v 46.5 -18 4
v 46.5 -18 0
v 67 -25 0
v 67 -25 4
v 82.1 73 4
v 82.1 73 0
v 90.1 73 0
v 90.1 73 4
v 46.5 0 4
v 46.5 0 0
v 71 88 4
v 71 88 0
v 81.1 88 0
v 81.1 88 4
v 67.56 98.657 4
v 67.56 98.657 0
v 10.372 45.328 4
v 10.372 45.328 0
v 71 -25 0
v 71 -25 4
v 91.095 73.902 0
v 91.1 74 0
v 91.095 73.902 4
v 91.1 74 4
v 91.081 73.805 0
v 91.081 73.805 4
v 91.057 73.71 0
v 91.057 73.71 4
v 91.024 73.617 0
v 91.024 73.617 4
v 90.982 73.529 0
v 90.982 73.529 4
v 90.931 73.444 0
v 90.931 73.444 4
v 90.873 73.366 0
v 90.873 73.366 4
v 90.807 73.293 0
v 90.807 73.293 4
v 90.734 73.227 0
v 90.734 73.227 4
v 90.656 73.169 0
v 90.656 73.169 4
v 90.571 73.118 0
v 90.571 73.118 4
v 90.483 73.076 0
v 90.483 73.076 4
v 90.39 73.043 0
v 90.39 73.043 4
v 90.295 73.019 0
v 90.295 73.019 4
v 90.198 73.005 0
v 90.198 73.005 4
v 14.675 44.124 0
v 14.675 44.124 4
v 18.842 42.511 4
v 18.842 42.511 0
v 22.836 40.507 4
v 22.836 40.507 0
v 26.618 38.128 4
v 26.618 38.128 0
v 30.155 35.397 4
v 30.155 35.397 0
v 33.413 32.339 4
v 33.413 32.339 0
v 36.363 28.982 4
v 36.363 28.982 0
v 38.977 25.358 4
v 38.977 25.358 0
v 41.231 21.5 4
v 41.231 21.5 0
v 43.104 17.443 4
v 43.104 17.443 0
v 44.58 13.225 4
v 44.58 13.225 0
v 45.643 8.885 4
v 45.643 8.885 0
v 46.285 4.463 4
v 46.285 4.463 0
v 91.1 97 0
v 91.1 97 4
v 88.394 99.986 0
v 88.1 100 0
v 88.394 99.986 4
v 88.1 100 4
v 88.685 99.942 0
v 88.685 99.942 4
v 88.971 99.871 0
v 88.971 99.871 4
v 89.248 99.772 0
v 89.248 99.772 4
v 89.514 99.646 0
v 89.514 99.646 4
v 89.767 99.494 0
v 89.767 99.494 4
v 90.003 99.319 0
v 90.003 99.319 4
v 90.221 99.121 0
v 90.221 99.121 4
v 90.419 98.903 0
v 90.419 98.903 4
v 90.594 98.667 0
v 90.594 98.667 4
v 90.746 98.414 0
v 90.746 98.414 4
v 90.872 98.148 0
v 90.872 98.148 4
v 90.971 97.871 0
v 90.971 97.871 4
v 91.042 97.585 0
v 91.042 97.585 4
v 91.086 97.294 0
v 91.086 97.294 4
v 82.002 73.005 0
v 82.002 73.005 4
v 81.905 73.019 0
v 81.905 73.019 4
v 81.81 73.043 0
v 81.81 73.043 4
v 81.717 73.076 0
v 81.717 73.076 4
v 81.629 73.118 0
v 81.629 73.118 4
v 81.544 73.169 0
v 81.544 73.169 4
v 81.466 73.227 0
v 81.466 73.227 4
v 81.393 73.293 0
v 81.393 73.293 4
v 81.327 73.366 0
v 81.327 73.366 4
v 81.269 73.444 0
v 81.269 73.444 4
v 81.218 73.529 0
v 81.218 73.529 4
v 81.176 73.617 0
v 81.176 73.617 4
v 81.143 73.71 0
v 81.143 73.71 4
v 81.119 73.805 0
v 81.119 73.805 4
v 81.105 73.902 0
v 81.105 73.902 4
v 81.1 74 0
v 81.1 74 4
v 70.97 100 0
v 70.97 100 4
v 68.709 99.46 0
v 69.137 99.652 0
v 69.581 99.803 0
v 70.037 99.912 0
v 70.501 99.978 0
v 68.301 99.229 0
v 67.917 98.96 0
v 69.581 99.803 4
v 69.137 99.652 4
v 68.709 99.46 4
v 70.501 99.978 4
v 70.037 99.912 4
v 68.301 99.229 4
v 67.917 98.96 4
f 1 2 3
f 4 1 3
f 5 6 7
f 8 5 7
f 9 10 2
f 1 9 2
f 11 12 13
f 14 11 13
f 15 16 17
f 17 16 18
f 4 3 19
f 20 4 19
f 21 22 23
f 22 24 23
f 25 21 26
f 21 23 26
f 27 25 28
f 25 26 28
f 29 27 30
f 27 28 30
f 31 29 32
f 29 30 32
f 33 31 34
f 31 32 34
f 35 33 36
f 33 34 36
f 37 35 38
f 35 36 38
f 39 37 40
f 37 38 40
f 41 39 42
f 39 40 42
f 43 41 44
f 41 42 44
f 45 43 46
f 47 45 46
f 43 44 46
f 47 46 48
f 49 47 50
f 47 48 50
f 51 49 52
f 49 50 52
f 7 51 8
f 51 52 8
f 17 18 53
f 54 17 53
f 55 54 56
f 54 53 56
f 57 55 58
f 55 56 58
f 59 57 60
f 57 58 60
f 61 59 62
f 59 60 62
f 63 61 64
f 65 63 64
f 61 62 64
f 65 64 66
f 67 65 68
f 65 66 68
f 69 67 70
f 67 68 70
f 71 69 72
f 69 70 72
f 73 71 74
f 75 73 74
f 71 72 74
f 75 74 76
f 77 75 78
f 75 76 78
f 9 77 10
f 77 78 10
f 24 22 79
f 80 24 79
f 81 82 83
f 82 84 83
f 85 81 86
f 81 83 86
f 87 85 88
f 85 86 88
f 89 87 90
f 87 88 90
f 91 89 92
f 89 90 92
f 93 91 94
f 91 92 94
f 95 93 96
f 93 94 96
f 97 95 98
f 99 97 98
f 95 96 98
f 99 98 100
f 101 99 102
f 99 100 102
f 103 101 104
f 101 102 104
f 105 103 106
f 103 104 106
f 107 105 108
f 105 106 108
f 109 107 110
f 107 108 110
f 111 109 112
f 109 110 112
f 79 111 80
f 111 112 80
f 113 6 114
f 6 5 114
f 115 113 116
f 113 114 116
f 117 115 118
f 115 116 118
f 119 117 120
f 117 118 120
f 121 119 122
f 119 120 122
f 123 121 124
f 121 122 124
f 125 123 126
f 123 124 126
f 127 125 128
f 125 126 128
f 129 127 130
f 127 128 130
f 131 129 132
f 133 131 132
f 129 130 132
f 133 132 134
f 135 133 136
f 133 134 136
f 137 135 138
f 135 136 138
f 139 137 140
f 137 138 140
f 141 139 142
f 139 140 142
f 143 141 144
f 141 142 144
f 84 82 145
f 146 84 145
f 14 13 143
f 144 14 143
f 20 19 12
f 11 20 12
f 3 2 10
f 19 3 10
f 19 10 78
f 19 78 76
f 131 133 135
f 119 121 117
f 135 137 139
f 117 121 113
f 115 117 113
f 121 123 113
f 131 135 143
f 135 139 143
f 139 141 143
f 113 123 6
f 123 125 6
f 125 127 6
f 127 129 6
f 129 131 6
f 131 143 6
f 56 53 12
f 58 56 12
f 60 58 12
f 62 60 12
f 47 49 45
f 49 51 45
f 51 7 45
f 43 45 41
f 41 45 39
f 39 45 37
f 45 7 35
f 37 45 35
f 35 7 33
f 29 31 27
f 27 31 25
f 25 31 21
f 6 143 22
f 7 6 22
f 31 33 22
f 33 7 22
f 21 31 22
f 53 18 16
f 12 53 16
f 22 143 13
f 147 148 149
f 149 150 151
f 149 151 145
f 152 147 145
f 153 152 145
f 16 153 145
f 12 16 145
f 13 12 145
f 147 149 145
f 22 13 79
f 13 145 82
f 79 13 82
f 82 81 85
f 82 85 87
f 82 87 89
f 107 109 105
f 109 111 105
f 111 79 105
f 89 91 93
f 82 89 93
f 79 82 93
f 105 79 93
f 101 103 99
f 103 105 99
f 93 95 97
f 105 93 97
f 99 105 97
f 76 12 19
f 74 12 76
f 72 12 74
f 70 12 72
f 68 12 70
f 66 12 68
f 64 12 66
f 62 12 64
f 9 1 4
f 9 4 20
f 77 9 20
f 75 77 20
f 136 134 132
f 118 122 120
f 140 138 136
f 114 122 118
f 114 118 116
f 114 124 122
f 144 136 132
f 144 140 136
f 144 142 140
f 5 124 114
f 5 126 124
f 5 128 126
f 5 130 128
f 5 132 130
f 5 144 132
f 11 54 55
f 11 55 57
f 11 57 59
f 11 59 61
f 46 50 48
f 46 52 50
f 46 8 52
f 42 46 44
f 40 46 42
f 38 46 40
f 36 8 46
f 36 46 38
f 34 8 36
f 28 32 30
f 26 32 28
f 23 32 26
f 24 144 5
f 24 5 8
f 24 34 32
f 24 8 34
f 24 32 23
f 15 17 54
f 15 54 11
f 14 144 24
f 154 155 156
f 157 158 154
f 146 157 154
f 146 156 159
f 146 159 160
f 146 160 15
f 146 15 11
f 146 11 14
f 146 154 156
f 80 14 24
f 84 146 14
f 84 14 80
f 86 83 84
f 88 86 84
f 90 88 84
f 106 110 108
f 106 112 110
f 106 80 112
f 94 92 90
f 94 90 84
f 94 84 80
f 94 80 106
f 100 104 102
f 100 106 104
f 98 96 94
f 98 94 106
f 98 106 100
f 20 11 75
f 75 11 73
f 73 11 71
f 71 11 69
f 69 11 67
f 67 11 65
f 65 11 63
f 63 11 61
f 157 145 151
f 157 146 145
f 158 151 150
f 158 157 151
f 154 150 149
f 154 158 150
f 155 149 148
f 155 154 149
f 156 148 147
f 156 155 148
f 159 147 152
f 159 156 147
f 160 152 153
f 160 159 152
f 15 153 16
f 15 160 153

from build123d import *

# Parameters (mm, degrees)
BOSS_EXTRU_1_DEPTH = 4
FILLET1_R          = 5
FILLET1_2_R        = 3
FILLET1_3_R        = 1


with BuildPart() as part:
    # Esquisse1 → Boss.-Extru.1 (new body)
    with BuildSketch(Plane.XY):
        with BuildLine():
            Line((46.5, 0), (46.5, -18))
            Line((46.5, -18), (67, -25))
            Line((67, -25), (71, -25))
            Line((71, -25), (71, 88))
            Line((71, 88), (81.1, 88))
            Line((81.1, 88), (81.1, 73))
            Line((81.1, 73), (91.1, 73))
            Line((91.1, 73), (91.1, 100))
            Line((91.1, 100), (69, 100))
            Line((69, 100), (10.371982926, 45.328489608))
            ThreePointArc((10.371982926, 45.328489608), (36.363080219, 28.982346298), (46.5, 0))
        make_face()
    extrude(amount=BOSS_EXTRU_1_DEPTH)

    # Fillet1
    fillet1_edges = [part.edges().sort_by_distance(p)[0] for p in [
        (69, 100, 2),
    ]]
    fillet(fillet1_edges, radius=FILLET1_R)

    # Fillet1 2
    fillet1_2_edges = [part.edges().sort_by_distance(p)[0] for p in [
        (91.1, 100, 2),
    ]]
    fillet(fillet1_2_edges, radius=FILLET1_2_R)

    # Fillet1 3
    fillet1_3_edges = [part.edges().sort_by_distance(p)[0] for p in [
        (91.1, 73, 2),
        (81.1, 73, 2),
    ]]
    fillet(fillet1_3_edges, radius=FILLET1_3_R)


solid = part.part
